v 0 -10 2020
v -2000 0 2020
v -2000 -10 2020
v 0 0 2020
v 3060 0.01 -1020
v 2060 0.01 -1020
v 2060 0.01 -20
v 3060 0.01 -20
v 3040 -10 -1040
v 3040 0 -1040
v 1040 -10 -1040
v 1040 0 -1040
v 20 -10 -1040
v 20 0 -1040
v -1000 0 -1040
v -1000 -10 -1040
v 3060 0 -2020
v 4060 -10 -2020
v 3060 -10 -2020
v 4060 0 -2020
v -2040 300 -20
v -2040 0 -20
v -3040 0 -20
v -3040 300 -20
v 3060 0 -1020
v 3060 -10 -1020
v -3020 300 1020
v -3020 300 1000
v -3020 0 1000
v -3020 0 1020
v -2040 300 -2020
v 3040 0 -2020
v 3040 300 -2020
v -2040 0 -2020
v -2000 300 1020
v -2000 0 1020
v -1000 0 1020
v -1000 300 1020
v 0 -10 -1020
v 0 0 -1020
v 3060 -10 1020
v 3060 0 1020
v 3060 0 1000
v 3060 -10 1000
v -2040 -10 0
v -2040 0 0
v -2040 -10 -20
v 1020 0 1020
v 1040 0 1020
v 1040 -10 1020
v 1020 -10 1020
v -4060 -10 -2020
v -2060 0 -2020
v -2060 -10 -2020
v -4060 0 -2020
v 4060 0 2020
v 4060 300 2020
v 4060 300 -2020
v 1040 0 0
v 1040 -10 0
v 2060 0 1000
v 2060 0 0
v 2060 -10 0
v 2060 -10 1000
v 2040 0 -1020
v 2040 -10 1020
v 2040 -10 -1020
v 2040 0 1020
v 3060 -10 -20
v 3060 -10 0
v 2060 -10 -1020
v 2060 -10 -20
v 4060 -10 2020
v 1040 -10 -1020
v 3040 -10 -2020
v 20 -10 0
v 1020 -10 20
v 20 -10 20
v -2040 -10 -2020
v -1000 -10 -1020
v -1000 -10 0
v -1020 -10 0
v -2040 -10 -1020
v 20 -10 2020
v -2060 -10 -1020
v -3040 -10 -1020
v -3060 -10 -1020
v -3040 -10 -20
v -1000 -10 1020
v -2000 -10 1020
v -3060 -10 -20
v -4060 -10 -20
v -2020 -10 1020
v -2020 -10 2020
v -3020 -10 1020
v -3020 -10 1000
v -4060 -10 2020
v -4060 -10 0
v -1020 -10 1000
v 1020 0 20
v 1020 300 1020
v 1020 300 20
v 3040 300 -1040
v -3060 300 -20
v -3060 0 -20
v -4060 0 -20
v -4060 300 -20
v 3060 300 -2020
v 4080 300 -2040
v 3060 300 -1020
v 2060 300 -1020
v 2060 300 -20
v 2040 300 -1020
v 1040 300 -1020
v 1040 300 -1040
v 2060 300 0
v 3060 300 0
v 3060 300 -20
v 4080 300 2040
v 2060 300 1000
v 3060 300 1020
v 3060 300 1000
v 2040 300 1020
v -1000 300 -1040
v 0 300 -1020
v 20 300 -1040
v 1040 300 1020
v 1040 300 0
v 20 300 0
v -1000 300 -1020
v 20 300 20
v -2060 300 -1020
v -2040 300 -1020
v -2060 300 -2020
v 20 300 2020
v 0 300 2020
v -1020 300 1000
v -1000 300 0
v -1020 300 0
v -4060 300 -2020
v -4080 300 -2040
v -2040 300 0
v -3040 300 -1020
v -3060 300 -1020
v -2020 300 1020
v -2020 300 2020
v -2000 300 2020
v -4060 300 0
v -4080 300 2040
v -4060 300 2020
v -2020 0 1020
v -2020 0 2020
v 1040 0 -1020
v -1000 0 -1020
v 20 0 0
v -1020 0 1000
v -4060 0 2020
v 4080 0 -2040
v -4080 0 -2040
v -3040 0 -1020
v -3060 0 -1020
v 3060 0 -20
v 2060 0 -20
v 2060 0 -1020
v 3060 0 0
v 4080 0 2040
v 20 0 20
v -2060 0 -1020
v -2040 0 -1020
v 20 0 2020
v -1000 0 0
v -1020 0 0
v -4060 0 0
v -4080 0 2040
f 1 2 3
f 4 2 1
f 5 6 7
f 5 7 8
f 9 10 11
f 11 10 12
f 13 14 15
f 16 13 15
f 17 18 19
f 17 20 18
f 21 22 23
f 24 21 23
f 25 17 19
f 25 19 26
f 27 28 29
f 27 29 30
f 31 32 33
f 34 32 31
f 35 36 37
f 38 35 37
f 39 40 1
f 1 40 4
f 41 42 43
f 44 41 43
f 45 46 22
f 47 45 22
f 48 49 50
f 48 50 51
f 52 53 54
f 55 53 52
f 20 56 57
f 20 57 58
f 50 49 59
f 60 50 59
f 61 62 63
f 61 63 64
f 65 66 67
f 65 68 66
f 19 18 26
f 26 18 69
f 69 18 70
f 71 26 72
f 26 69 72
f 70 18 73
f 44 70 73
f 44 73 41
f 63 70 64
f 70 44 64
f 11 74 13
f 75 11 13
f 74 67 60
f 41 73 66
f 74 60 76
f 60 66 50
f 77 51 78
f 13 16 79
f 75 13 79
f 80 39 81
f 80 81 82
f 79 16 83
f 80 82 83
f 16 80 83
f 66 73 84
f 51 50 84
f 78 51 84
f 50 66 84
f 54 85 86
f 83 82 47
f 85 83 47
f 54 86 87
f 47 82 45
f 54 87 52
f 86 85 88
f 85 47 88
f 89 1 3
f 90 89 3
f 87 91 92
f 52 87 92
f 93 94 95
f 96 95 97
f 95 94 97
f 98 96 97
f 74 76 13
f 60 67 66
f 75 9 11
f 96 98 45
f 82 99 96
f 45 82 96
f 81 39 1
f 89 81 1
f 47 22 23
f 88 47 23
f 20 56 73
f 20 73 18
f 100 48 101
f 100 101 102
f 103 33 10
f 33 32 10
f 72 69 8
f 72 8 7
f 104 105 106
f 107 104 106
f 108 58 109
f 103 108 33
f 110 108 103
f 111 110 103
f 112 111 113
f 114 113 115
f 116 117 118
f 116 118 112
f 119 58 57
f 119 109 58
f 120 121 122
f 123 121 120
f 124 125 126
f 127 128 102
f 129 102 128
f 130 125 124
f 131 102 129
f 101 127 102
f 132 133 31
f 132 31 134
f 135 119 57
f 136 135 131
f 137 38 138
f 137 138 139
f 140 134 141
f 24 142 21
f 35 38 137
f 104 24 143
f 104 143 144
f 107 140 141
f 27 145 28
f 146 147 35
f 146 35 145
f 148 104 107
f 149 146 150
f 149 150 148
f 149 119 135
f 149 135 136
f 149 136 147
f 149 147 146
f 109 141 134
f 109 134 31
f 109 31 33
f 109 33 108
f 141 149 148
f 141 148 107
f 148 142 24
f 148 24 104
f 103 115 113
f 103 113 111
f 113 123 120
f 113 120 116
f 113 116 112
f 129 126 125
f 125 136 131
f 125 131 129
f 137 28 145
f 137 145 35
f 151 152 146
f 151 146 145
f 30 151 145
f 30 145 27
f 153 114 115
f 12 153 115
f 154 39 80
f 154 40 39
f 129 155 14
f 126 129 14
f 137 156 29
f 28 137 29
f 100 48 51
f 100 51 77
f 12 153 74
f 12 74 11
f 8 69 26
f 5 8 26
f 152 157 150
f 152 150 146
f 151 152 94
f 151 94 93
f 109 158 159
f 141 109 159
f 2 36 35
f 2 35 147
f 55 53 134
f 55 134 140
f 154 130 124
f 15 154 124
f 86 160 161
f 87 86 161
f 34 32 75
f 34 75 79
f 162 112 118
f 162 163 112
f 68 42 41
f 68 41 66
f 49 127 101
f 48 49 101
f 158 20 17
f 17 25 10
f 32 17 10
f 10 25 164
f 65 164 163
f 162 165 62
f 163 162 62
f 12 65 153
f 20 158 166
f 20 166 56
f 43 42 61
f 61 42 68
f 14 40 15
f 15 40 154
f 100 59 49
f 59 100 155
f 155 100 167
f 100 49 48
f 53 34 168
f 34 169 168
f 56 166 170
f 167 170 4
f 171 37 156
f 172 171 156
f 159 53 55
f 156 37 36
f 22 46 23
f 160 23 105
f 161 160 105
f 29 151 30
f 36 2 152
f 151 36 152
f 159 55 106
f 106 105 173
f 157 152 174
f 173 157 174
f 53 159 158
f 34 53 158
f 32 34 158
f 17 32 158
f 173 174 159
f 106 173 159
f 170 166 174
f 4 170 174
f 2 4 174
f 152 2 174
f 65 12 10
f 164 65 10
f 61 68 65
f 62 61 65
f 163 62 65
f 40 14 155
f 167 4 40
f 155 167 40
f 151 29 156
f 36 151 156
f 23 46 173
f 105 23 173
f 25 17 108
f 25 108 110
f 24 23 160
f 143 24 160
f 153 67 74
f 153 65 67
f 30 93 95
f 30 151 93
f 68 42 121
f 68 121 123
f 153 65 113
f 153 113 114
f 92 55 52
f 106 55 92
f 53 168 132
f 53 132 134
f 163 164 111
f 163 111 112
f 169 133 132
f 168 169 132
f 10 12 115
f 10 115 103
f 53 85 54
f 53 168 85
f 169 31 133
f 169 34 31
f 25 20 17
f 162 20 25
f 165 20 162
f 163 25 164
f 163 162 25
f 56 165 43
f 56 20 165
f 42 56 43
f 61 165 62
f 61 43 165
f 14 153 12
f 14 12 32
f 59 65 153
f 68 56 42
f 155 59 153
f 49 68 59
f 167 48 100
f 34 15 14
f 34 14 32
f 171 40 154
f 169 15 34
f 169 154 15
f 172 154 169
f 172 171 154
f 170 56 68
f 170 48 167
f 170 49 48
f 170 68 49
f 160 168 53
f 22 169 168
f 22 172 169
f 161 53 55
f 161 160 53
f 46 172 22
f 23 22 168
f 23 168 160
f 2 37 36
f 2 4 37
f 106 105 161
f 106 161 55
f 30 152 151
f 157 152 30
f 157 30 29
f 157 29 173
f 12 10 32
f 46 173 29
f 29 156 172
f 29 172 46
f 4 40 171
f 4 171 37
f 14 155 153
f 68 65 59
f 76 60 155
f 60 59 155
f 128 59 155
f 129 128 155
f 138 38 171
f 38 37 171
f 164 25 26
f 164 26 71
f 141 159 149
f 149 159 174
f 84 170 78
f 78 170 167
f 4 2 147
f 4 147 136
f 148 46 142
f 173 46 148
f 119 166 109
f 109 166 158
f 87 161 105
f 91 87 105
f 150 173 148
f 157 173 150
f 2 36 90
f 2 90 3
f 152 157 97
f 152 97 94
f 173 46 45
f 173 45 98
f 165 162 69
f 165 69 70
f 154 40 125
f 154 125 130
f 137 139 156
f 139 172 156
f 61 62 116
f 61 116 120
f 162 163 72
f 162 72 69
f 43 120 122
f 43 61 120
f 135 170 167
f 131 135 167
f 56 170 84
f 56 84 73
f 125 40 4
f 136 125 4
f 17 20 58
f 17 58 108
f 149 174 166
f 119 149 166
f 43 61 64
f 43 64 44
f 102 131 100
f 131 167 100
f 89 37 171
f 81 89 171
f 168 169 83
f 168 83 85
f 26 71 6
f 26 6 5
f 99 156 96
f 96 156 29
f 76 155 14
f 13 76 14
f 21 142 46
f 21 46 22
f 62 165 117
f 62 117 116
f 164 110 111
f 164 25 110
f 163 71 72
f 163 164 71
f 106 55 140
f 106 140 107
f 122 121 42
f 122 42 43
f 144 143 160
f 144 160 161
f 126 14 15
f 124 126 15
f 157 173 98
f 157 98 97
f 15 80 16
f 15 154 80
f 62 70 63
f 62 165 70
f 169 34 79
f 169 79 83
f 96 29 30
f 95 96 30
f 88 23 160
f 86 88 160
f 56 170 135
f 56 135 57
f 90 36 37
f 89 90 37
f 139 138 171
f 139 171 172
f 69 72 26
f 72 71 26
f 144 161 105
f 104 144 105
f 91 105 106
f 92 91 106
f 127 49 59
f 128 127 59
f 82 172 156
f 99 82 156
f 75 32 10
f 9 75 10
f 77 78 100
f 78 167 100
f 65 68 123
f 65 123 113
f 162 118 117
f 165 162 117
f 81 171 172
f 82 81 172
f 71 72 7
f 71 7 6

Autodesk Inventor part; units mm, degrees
ref_plane "YZ Plane" through (0, 0, 0) normal (1, 0, 0) x (0, 1, 0)
ref_plane "XZ Plane" through (0, 0, 0) normal (0, 1, 0) x (-1, 0, 0)
ref_plane "XY Plane" through (0, 0, 0) normal (0, 0, 1) x (1, 0, 0)
sketch "Эскиз1" plane through (0, 0, 0) normal (0, 1, 0) x (-1, 0, 0)
  line L0 (-4060, 2020) -> (-4060, -2020)
  line L1 (-3060, -2020) -> (-3060, -1020)
  line L2 (-2060, 1000) -> (-3060, 1000)
  line L3 (-2060, -20) -> (-3060, -20)
  line L4 (-5712, 0) -> (5712, 0) projected
  line L5 (5712, 0) -> (-5712, 0) projected
  line L6 (0, -2856) -> (0, 2856) projected
  line L7 (4080, 2040) -> (-4080, 2040)
  line L8 (-4080, 2040) -> (-4080, -2040)
  line L9 (-4080, -2040) -> (4080, -2040)
  line L10 (4080, -2040) -> (4080, 2040)
  line L11 (-3040, -2020) -> (-3040, -1040)
  line L12 (-3040, -1040) -> (-2040, -1040)
  line L13 (-2060, 0) -> (-3060, 0)
  line L14 (-3060, 1020) -> (-2040, 1020)
  line L15 (-2040, 1020) -> (-2040, -1020)
  line L16 (-3060, -1020) -> (-2060, -1020)
  line L17 (-2060, -1020) -> (-2060, -20)
  line L18 (-2060, 0) -> (-2060, 1000)
  line L19 (-3060, 1020) -> (-3060, 1000)
  line L20 (-3060, -20) -> (-3060, 0)
  line L21 (-20, -1040) -> (1000, -1040)
  line L22 (0, 2020) -> (0, -1020)
  line L23 (0, -1020) -> (1000, -1020)
  line L24 (1000, -1020) -> (1000, -1040)
  line L25 (-2040, -1020) -> (-1040, -1020)
  line L26 (-1040, -1020) -> (-1040, -1040)
  line L27 (-1040, -1040) -> (-2040, -1040)
  line L28 (-1040, 1020) -> (-1040, 0)
  line L29 (-1040, 0) -> (-20, 0)
  line L30 (-1020, 1020) -> (-1020, 20)
  line L31 (-20, 2020) -> (-20, 20)
  line L32 (-20, 0) -> (-20, -1040)
  line L33 (-1040, 1020) -> (-1020, 1020)
  line L34 (2040, -2020) -> (2040, -1020)
  line L35 (2040, -1020) -> (2060, -1020)
  line L36 (2060, -1020) -> (2060, -2020)
  line L37 (2000, 1020) -> (2000, 2020)
  line L38 (2020, 2020) -> (2020, 1020)
  line L39 (2000, 1020) -> (1000, 1020)
  line L40 (1000, 1020) -> (1000, 0)
  line L41 (1386.822, 1000) -> (1386.822, 997)
  line L42 (-20, 2020) -> (-4060, 2020)
  line L43 (4060, 2020) -> (2020, 2020)
  line L44 (2000, 2020) -> (0, 2020)
  line L45 (-20, 20) -> (-1020, 20)
  line L46 (4060, 0) -> (2040, 0)
  line L47 (2040, 0) -> (2040, -20)
  line L48 (2040, -20) -> (3040, -20)
  line L49 (3040, -20) -> (3040, -1020)
  line L50 (3040, -1020) -> (3060, -1020)
  line L51 (3060, -1020) -> (3060, -20)
  line L52 (3060, -20) -> (4060, -20)
  line L53 (4060, -2020) -> (4060, -20)
  line L54 (4060, 0) -> (4060, 2020)
  line L55 (-4060, -2020) -> (2040, -2020)
  line L56 (2060, -2020) -> (4060, -2020)
  line L57 (1000, 0) -> (1020, 0)
  line L58 (1020, 0) -> (1020, 1000)
  line L59 (1020, 1000) -> (3020, 1000)
  line L60 (3020, 1000) -> (3020, 1020)
  line L61 (2020, 1020) -> (3020, 1020)
  point P0 (0, 0)
  point P1 (4080, 0)
  point P2 (0, 2040)
  point P3 (1093.178, 0)
  point P4 (-20, 0)
  point P5 (0, 1020)
  point P6 (0, 2020)
  point P7 (-4060, 0)
  point P8 (0, 0)
  point P9 (9.9936, 474.3673)
  point P10 (-4080, 0)
  point P11 (0, -2040)
  point P12 (-1040, 0)
  point P13 (0, -2020)
  point P14 (0, -1020)
  point P15 (0, -1040)
  dimension "d6" = 20
  dimension "d10" = 1000
  dimension "d11" = 1000
  dimension "d17" = 20
  dimension "d18" = 20
  dimension "d20" = 20
  dimension "d21" = 20
  dimension "d22" = 20
  dimension "d23" = 1000
  dimension "d24" = 20
  dimension "d26" = 20
  dimension "d27" = 20
  dimension "d28" = 20
  dimension "d29" = 20
  dimension "d30" = 20
  dimension "d31" = 20
  dimension "d32" = 20
  dimension "d33" = 20
  dimension "d34" = 20
  dimension "d35" = 20
extrude "Выдавливание1" add sketch "Эскиз1" along normal blind 300 contours L0 L4 L8 L7 L6 L28 L33 L30 L45 L31 L42 | L0 L55 L6 L9 L8 L4 | L4 L15 L25 L26 L27 L12 L11 L55 L1 L16 L17 L3 L20 | L18 L2 L19 L14 L15 L4 | L7 L10 L4 L54 L43 L38 L61 L60 L59 L58 L40 L39 L37 L44 L6 | L6 L55 L34 L35 L36 L56 L53 L52 L51 L50 L49 L48 L47 L4 L10 L9 | L21 L32 L4 L6 | L6 L23 L24 L21
extrude "Выдавливание2" add sketch "Эскиз1" against normal blind 10 contours L42 L31 L45 L30 L33 L28 L4 L15 L14 L19 L2 L18 L0 | L4 L20 L3 L17 L16 L1 L55 L0 | L11 L12 L27 L26 L25 L15 L4 L32 L21 L6 L55 | L6 L21 L24 L23 L4 L47 L48 L49 L50 L51 L52 L53 L56 L36 L35 L34 L55 | L44 L37 L39 L40 L4 L6 | L4 L58 L59 L60 L61 L38 L43 L54
ref_plane "РабПлоскость1" through (3060, 300, 1020) normal (1, 0, 0) x (0, 0, -1)
sketch "Эскиз2" plane through (0, 0, 0) normal (0, 1, 0) x (1, 0, 0)
  line L0 (3060, 20) -> (2060, 20) projected
  line L1 (3060, 20) -> (3060, 1024)
  line L2 (2060, 20) -> (2060, 1020) projected
  line L3 (2060, 1020) -> (3060, 1020) projected
  point P0 (0, 0)
extrude "Выдавливание3" add sketch "Эскиз2" along normal blind 0.01 and the other way blind 10 separate body
sketch "Эскиз3" plane through (0, 0, 0) normal (0, 1, 0) x (1, 0, 0)
  line L0 (4080, -2040) -> (4080, 2040) projected
  line L1 (-4080, 2040) -> (-4080, -2040) projected
  line L2 (4060, 2020) -> (4060, -2020) projected
  line L3 (3060, 1020) -> (3060, 2020) projected
  line L4 (-4080, -2040) -> (4080, -2040) projected
  line L5 (4080, 2040) -> (-4080, 2040) projected
  line L6 (3060, 20) -> (2060, 20) projected
  line L7 (2060, 1020) -> (3060, 1020) projected
  point P0 (0, 0)
  dimension "d41" = 8160
  dimension "d42" = 1000
  dimension "d43" = 4080
  dimension "d44" = 1000
equation "\"d10\" = d1"
equation "\"d20\" = d3"
equation "\"d21\" = d3"
equation "\"d22\" = d3"
equation "\"d23\" = d1"
equation "\"d24\" = d3"
equation "\"d26\" = d3"
equation "\"d27\" = d3"
equation "\"d28\" = d3"
equation "\"d29\" = d3"
equation "\"d30\" = d3"
equation "\"d31\" = d3"
equation "\"d32\" = d3"
equation "\"d33\" = d3"
equation "\"d34\" = d3"
equation "\"d35\" = d3"
equation "\"d1\" = 1000"
equation "\"d3\" = 20"
properties part number "лабиринт"
